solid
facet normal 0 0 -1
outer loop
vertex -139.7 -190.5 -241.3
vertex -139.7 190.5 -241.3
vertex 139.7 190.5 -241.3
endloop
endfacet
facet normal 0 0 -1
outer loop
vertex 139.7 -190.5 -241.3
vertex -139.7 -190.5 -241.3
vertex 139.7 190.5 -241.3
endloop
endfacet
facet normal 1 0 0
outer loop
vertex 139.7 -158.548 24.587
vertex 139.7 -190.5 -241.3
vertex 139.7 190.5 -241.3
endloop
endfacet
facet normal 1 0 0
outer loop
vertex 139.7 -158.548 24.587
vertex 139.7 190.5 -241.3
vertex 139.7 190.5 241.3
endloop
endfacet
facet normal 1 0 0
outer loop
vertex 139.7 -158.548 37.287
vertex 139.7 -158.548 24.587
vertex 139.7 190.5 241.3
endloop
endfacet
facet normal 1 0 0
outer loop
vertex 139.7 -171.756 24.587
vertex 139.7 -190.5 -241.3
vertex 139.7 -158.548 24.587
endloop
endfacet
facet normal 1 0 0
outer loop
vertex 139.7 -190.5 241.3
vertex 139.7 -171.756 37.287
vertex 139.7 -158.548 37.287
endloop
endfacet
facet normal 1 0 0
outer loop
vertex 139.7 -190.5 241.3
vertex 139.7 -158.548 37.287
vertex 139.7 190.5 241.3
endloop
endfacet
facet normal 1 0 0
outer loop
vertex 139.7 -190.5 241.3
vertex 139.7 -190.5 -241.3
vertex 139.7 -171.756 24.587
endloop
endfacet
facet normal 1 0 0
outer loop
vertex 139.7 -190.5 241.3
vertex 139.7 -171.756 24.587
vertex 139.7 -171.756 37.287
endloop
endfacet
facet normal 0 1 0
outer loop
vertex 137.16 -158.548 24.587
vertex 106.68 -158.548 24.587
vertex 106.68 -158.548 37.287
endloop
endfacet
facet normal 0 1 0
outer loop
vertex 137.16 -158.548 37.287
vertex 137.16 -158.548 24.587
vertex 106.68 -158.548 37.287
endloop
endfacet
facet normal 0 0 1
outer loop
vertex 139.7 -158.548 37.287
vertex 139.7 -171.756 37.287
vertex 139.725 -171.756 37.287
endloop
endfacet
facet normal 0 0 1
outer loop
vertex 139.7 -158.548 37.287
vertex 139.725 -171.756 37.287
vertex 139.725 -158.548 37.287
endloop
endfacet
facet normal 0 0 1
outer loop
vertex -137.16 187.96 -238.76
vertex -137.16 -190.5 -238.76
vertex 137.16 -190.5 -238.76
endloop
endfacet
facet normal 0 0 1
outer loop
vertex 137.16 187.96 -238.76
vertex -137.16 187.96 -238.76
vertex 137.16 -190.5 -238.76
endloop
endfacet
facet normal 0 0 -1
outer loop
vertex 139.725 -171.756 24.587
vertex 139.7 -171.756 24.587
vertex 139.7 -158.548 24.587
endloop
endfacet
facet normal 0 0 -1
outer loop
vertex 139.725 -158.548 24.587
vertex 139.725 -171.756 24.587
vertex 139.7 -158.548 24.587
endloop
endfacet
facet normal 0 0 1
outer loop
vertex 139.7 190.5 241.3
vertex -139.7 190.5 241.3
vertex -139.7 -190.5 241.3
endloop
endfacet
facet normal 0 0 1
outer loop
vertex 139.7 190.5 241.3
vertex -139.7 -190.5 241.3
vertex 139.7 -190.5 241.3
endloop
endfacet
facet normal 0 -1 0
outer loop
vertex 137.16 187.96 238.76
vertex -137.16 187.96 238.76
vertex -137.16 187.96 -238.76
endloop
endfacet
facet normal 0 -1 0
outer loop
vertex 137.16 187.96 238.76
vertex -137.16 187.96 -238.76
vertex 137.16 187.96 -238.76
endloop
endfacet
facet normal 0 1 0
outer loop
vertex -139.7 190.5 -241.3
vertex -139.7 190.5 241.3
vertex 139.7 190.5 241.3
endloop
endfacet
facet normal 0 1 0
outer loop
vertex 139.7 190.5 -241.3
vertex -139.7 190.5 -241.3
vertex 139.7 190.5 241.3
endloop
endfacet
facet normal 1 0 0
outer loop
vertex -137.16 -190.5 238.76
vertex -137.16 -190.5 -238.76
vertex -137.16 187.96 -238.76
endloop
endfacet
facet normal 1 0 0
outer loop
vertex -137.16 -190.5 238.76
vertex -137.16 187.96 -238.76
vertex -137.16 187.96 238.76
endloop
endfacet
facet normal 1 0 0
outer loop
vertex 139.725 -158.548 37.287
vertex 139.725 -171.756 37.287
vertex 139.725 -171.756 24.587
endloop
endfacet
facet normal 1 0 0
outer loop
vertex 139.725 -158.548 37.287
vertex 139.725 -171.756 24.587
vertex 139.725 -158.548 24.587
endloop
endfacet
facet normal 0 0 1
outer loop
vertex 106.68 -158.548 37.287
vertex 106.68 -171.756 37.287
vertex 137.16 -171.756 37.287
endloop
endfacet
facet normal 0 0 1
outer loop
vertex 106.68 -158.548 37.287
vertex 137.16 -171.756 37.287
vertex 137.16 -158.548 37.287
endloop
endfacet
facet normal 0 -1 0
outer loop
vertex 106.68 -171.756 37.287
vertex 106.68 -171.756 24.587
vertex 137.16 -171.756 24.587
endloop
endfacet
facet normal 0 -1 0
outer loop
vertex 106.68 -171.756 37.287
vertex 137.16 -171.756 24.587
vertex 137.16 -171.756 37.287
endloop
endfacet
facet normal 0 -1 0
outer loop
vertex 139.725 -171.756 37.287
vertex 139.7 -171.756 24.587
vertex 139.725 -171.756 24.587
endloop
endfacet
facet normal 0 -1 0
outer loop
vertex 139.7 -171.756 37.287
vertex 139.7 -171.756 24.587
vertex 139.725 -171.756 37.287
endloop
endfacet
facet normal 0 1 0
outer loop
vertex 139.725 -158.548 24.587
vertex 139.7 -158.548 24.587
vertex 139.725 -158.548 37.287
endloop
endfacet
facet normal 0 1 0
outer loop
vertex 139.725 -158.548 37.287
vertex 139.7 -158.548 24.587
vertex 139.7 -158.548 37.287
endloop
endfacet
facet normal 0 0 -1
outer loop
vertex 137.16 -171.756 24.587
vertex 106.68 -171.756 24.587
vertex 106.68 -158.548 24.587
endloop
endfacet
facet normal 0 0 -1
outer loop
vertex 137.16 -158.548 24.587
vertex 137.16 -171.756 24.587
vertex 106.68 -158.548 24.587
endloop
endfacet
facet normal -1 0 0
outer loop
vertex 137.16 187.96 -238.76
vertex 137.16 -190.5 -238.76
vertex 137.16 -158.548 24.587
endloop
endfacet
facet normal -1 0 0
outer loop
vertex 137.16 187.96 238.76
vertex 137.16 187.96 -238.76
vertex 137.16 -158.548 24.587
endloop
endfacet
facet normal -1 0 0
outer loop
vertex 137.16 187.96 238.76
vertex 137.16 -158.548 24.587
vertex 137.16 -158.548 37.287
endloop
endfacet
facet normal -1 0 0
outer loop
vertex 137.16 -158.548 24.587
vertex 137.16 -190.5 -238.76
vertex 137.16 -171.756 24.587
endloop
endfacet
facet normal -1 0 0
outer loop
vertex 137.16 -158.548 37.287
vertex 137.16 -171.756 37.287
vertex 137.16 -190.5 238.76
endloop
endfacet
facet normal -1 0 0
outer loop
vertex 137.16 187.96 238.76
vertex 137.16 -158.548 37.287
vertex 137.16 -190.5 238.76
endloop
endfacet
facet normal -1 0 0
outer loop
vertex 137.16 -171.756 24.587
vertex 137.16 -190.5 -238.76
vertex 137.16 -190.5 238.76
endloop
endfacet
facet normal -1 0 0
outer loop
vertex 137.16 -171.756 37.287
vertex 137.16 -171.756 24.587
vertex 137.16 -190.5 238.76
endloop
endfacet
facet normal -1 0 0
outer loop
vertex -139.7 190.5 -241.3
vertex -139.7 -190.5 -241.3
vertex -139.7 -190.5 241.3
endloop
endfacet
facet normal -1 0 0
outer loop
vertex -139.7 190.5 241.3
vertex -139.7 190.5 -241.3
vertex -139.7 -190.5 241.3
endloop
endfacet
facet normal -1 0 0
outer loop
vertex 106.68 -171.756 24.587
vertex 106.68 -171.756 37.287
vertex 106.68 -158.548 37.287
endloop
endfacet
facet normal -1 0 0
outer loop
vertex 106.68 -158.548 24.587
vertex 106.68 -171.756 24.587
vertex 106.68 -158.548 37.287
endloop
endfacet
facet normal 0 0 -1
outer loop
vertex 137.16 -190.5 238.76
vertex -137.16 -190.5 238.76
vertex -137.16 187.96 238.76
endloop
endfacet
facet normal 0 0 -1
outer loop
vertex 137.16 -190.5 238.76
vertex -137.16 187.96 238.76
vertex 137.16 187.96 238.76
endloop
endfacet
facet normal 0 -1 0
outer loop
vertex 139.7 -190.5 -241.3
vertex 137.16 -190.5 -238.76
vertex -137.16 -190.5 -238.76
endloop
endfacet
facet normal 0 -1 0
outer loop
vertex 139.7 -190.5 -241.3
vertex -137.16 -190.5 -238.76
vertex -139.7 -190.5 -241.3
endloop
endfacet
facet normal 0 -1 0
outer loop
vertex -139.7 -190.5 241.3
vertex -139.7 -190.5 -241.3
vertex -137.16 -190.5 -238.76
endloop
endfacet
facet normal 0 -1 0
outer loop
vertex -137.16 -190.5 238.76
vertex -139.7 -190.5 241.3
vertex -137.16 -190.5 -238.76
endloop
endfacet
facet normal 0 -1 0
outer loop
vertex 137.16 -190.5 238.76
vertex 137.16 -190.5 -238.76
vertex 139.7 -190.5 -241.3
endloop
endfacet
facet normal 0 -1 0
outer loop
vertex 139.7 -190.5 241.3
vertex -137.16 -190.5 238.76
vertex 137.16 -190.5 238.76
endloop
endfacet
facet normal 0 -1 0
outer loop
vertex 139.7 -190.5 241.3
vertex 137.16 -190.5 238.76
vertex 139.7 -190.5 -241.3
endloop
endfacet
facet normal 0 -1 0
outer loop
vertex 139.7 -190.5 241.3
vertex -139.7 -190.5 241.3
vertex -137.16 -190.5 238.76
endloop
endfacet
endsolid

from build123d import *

# Parameters (mm, degrees)
F0_W          = 279.4
F0_H          = 482.6
F1_DEPTH      = 190.5
F2_T          = -2.54
F3_W          = 13.208
F3_H          = 12.7
F4_DEPTH      = 0.0254
F4_DEPTH_BACK = 33.02


with BuildPart() as f1:
    # F0 (on Front) → F1 (new body, symmetric)
    with BuildSketch(Plane.XZ):
        Rectangle(F0_W, F0_H)
    extrude(amount=F1_DEPTH, both=True)

    # F2
    f2_openings = [f1.faces().sort_by_distance(p)[0] for p in [
        (0, -190.5, 0),
    ]]
    offset(amount=F2_T, openings=f2_openings)

    # F3 (on face) → F4 (join, two sides)
    with BuildSketch(Plane.YZ.offset(139.7)) as f4_sk:
        with Locations((-165.152445, 30.9372)):
            Rectangle(F3_W, F3_H)
    extrude(amount=F4_DEPTH)
    extrude(f4_sk.sketch, amount=-F4_DEPTH_BACK)


solid = f1.part
